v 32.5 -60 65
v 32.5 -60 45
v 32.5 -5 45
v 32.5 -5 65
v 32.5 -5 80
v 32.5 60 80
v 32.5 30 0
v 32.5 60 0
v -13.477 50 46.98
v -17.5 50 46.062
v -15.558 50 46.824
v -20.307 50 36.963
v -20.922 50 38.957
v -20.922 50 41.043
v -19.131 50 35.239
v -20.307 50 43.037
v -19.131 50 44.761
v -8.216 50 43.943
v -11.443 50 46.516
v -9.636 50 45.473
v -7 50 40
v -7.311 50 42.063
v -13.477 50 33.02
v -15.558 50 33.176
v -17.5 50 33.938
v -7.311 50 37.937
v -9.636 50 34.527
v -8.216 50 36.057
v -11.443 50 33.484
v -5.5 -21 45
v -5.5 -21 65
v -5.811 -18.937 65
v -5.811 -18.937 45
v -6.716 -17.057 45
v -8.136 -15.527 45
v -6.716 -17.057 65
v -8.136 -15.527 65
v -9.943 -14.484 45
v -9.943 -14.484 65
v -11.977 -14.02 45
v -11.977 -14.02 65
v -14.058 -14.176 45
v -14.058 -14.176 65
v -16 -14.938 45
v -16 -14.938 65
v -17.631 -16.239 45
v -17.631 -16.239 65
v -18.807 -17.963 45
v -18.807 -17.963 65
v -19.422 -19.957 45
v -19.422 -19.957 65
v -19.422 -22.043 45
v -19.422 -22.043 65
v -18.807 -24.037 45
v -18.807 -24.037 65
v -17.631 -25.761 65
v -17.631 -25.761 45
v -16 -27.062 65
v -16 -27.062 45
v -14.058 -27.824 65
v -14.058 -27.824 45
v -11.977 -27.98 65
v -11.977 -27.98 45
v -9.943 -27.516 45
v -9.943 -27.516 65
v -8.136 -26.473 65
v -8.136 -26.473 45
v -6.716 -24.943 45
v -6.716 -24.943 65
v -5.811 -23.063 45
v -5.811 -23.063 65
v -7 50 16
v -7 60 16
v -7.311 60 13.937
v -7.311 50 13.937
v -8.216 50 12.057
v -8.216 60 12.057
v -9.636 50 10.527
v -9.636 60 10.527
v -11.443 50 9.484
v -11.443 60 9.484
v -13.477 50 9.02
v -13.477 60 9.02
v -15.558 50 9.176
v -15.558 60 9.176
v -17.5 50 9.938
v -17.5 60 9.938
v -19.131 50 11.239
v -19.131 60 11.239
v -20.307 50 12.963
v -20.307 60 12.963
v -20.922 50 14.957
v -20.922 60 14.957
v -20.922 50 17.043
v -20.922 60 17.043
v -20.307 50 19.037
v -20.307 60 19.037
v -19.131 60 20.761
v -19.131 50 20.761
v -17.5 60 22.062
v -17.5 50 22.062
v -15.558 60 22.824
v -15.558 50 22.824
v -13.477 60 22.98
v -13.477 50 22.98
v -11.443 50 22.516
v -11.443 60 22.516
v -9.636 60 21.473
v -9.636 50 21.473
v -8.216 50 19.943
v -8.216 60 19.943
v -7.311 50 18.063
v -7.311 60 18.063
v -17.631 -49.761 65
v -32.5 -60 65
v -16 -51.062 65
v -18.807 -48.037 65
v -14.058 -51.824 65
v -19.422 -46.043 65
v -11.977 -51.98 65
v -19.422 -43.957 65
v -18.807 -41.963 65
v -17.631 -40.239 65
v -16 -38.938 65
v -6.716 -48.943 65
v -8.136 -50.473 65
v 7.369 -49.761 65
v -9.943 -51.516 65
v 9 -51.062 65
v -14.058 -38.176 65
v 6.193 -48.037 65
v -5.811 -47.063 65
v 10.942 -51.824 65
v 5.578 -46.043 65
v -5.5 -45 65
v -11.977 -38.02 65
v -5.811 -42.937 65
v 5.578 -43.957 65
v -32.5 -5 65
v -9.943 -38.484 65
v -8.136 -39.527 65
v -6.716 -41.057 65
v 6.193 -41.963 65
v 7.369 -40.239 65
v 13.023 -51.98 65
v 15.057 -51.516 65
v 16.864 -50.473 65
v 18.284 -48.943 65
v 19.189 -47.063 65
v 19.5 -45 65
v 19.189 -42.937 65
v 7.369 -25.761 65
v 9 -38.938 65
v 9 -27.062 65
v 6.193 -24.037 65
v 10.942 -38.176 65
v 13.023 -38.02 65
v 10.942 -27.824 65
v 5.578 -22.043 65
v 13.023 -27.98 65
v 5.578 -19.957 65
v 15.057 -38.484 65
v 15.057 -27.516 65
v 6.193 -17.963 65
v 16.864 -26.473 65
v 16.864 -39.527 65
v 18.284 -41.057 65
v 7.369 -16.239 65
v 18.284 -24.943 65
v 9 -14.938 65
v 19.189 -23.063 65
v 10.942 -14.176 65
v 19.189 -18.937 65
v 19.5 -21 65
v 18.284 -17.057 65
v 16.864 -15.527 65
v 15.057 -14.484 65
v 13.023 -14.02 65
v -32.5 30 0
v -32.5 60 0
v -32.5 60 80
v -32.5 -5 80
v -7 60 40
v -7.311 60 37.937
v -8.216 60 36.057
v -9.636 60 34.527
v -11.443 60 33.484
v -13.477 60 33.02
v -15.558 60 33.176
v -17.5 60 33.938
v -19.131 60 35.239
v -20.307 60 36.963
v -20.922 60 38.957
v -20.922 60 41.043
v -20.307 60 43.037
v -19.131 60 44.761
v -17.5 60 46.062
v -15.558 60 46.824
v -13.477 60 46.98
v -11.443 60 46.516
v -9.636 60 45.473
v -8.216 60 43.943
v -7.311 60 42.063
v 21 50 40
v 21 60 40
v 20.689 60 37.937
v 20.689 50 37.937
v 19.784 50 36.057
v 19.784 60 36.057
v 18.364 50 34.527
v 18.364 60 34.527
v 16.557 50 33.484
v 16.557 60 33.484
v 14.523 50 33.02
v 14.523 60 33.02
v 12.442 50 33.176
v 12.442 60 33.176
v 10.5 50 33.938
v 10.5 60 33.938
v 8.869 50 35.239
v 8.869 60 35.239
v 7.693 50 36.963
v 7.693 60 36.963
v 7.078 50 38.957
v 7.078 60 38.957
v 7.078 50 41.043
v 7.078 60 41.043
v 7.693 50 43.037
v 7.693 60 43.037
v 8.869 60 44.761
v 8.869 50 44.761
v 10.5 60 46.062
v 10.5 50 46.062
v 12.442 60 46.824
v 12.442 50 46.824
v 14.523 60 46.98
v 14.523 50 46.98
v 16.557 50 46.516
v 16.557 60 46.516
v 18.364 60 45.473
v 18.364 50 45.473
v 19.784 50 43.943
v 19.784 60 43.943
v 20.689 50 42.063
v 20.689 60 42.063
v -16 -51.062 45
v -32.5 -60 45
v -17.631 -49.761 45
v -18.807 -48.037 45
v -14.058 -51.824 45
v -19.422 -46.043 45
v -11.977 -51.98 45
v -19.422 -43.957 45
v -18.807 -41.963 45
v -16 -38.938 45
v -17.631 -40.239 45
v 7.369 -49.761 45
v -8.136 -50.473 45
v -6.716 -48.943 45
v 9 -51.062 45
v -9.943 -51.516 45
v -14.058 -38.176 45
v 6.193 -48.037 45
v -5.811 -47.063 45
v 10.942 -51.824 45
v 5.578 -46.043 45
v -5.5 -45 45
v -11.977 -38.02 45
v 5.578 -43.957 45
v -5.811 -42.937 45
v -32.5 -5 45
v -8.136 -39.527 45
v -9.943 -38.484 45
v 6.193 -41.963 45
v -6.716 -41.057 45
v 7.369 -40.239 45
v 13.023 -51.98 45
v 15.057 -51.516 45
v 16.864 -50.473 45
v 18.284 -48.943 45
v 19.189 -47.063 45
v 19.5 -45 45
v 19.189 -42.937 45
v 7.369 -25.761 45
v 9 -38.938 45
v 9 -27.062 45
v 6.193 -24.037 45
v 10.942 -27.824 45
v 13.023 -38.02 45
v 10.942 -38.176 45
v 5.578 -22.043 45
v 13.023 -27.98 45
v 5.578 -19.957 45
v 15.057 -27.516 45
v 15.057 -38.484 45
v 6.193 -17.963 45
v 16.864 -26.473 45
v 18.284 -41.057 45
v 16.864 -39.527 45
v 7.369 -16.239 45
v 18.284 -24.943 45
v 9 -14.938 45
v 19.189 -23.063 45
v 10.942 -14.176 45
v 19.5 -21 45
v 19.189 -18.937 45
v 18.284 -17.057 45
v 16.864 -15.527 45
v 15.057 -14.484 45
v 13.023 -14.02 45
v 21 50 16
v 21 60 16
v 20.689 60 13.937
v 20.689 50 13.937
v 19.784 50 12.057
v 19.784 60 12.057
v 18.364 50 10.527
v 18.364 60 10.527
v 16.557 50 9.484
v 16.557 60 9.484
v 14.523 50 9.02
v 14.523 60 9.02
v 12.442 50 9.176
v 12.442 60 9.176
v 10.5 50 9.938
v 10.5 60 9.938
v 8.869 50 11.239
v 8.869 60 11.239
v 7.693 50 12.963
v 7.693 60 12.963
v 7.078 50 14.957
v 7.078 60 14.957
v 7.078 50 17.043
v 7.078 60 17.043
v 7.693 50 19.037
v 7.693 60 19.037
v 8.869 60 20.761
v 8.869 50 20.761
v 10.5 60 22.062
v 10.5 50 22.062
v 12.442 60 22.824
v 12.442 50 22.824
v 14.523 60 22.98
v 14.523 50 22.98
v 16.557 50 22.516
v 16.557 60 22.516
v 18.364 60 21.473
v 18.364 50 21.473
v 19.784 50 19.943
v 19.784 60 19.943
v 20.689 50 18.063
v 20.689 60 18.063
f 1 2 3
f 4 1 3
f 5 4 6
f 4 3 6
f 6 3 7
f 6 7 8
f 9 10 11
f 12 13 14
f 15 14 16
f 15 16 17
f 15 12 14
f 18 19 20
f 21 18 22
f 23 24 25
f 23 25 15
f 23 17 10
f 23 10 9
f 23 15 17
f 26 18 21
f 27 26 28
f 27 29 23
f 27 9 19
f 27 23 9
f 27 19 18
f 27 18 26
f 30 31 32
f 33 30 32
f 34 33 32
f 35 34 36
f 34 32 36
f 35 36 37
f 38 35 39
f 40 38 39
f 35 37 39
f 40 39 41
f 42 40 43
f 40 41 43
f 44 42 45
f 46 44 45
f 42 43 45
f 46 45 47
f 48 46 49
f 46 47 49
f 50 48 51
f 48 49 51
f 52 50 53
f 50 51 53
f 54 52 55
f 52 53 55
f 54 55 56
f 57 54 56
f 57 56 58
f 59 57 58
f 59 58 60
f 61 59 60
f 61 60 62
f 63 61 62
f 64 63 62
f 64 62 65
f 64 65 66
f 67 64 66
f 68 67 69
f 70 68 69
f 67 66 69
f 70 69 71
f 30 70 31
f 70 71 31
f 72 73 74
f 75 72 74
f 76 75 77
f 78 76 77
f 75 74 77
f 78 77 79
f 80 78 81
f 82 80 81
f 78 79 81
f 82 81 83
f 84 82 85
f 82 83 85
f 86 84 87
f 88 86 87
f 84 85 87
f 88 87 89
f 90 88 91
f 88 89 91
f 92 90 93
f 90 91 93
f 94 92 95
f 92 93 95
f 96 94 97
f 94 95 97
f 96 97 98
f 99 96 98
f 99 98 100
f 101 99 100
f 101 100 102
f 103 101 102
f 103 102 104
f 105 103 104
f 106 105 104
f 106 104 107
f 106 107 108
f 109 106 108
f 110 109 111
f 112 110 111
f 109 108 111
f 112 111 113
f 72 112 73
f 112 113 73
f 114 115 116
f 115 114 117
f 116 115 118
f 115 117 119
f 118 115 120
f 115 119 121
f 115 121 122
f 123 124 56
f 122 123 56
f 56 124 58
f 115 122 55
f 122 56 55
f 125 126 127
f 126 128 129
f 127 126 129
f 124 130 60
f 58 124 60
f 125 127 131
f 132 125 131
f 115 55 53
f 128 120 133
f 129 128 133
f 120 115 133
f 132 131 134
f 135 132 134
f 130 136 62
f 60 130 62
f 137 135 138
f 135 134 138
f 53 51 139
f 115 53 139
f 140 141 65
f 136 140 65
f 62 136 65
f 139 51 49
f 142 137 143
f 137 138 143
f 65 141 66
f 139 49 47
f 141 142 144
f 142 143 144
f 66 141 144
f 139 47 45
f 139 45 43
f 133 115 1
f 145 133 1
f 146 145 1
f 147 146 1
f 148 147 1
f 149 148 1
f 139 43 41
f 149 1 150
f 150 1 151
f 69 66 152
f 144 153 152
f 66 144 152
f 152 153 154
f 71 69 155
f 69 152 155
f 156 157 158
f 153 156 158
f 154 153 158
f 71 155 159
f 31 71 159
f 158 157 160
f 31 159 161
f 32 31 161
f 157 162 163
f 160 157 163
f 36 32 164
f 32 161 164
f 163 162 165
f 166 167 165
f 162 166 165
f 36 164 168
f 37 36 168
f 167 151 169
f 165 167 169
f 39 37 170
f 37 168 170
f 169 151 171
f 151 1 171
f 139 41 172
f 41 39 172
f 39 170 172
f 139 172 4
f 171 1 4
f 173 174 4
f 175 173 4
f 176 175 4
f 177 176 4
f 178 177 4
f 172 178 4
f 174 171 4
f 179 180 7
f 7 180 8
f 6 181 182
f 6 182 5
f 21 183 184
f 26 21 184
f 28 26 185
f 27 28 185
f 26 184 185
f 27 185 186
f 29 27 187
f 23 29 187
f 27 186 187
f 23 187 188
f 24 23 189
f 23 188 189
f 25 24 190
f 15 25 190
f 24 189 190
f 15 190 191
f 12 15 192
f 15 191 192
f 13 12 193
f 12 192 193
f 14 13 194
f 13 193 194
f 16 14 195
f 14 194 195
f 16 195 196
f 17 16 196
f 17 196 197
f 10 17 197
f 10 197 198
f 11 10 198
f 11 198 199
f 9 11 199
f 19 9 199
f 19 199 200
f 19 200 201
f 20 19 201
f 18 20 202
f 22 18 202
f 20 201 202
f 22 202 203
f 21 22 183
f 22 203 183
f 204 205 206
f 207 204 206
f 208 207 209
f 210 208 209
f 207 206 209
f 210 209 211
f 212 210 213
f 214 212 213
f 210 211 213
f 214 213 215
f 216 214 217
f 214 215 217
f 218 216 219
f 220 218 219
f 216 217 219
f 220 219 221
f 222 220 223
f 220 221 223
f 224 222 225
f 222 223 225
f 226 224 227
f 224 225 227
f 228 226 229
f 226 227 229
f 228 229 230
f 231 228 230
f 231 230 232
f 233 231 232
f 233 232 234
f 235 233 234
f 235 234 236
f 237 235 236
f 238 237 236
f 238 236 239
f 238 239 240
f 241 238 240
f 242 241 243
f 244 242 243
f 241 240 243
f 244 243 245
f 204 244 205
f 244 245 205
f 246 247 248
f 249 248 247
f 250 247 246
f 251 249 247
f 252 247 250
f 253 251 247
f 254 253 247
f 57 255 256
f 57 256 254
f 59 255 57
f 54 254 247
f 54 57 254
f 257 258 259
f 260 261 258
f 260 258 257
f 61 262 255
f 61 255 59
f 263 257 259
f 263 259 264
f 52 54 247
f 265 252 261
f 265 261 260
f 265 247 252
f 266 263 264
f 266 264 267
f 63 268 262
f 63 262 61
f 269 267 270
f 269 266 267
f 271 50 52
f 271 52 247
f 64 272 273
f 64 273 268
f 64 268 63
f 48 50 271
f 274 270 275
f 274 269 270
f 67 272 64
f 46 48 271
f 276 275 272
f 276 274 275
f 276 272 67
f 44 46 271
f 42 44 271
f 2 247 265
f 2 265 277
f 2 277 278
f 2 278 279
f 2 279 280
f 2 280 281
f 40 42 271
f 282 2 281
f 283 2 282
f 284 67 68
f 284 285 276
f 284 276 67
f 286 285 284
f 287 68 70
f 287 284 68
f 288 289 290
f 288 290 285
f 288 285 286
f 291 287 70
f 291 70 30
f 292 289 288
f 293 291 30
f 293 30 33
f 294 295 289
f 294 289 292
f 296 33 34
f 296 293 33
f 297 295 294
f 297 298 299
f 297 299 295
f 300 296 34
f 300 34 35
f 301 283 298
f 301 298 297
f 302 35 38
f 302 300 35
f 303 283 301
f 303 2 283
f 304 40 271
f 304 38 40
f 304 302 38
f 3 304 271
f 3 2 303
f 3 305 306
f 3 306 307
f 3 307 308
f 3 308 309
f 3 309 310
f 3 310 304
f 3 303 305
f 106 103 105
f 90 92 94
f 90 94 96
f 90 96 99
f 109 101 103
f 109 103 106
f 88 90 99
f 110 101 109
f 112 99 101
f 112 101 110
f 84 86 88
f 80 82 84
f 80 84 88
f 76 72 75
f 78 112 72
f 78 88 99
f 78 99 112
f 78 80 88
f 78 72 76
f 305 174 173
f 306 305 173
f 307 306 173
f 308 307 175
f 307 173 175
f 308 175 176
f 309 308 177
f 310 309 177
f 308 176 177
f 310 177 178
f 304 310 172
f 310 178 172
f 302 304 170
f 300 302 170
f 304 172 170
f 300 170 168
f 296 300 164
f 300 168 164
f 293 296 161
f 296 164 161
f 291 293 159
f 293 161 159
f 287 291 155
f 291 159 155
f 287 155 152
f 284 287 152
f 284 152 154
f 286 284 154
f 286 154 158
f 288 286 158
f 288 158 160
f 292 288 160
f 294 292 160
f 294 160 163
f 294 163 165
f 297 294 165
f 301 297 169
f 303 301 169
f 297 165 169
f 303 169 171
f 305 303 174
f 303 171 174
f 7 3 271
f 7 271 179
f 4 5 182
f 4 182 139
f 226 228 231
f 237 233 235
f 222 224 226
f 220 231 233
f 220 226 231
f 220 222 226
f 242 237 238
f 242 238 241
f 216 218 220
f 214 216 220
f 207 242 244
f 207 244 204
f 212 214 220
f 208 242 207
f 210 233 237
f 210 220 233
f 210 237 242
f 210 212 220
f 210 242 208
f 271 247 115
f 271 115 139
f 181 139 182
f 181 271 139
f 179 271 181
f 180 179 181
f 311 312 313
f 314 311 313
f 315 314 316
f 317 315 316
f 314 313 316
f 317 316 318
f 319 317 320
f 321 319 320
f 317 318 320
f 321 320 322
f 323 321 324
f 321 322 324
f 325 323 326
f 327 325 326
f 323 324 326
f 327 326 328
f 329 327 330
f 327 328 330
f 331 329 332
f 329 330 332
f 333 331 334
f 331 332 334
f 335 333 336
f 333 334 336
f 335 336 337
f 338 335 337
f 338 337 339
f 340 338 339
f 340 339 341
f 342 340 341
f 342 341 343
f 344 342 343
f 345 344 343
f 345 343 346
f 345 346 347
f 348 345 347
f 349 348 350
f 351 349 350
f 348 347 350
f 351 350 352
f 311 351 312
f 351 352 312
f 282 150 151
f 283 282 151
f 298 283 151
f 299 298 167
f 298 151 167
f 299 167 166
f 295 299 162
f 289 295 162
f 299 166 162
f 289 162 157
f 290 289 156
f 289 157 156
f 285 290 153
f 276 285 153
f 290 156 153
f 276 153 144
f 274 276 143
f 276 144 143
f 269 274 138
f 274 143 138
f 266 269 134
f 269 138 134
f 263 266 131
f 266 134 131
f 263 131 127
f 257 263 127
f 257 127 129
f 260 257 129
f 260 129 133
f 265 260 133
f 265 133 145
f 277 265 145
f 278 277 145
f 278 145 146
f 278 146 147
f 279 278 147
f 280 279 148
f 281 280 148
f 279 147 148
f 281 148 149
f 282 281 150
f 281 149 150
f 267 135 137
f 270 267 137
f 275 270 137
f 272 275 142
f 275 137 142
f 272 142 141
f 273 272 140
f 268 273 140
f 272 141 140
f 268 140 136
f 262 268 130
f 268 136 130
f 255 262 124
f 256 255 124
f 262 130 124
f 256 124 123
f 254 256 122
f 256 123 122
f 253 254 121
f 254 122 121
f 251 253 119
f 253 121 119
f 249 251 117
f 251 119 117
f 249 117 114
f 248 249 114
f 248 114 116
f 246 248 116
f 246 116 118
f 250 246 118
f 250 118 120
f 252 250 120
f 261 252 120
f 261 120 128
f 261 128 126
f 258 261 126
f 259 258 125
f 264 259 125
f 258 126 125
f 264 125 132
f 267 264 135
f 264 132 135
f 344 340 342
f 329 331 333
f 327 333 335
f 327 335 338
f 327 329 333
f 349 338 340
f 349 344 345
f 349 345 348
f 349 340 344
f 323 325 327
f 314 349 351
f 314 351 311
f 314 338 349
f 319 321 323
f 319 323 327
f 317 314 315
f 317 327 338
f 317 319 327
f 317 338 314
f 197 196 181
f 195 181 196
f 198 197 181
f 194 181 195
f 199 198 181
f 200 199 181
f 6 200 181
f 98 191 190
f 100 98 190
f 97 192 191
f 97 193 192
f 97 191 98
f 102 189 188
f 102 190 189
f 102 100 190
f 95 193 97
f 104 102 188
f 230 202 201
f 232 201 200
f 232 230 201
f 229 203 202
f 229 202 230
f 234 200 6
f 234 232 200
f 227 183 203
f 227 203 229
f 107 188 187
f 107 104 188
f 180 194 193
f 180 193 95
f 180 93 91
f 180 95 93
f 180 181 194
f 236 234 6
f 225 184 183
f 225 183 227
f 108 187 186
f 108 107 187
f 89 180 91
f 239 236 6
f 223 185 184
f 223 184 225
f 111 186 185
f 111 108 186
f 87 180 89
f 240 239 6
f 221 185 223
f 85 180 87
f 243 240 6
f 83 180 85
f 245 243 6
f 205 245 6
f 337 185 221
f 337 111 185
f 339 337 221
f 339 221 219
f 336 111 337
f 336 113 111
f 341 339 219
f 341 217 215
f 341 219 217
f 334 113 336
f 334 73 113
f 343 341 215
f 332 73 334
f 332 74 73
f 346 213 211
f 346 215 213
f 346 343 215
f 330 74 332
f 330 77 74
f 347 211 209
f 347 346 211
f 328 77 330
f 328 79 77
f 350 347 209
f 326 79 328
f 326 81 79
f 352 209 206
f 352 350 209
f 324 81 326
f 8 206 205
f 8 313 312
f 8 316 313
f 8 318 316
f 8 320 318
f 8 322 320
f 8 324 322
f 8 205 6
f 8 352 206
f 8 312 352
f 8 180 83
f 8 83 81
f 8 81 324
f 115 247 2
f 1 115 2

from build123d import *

# Parameters (mm, degrees)
CROQUIS1_W              = 65
CROQUIS1_H              = 120
SALIENTE_EXTRUIR1_DEPTH = 80
CROQUIS2_W              = 15
CROQUIS2_H              = 55
CORTAR_EXTRUIR1_DEPTH   = 80
CROQUIS3_R              = 7
CORTAR_EXTRUIR2_DEPTH   = 20
CROQUIS4_R              = 7
CORTAR_EXTRUIR3_DEPTH   = 10


with BuildPart() as part:
    # Croquis1 → Saliente-Extruir1 (new body)
    with BuildSketch(Plane.XY):
        Rectangle(CROQUIS1_W, CROQUIS1_H)
    extrude(amount=SALIENTE_EXTRUIR1_DEPTH)

    # Croquis2 → Cortar-Extruir1 (cut)
    with BuildSketch(Plane(origin=(32.5, 0, 0), x_dir=(0, 0, -1), z_dir=(1, 0, 0))):
        with Locations((-72.5, -32.5)):
            Rectangle(CROQUIS2_W, CROQUIS2_H)
        Polygon((-45, -60), (-45, -5), (0, 30), (0, -60), align=None)
    extrude(amount=-CORTAR_EXTRUIR1_DEPTH, mode=Mode.SUBTRACT)

    # Croquis3 → Cortar-Extruir2 (cut)
    with BuildSketch(Plane.XY.offset(65)):
        with Locations((-12.5, -21)):
            Circle(CROQUIS3_R)
        with Locations((-12.5, -45)):
            Circle(CROQUIS3_R)
        with Locations((12.5, -21)):
            Circle(CROQUIS3_R)
        with Locations((12.5, -45)):
            Circle(CROQUIS3_R)
    extrude(amount=-CORTAR_EXTRUIR2_DEPTH, mode=Mode.SUBTRACT)

    # Croquis4 → Cortar-Extruir3 (cut)
    with BuildSketch(Plane(origin=(0, 60, 0), x_dir=(1, 0, 0), z_dir=(0, 1, 0))):
        with Locations((14, -16)):
            Circle(CROQUIS4_R)
        with Locations((-14, -16)):
            Circle(CROQUIS4_R)
        with Locations((14, -40)):
            Circle(CROQUIS4_R)
        with Locations((-14, -40)):
            Circle(CROQUIS4_R)
    extrude(amount=-CORTAR_EXTRUIR3_DEPTH, mode=Mode.SUBTRACT)


solid = part.part
